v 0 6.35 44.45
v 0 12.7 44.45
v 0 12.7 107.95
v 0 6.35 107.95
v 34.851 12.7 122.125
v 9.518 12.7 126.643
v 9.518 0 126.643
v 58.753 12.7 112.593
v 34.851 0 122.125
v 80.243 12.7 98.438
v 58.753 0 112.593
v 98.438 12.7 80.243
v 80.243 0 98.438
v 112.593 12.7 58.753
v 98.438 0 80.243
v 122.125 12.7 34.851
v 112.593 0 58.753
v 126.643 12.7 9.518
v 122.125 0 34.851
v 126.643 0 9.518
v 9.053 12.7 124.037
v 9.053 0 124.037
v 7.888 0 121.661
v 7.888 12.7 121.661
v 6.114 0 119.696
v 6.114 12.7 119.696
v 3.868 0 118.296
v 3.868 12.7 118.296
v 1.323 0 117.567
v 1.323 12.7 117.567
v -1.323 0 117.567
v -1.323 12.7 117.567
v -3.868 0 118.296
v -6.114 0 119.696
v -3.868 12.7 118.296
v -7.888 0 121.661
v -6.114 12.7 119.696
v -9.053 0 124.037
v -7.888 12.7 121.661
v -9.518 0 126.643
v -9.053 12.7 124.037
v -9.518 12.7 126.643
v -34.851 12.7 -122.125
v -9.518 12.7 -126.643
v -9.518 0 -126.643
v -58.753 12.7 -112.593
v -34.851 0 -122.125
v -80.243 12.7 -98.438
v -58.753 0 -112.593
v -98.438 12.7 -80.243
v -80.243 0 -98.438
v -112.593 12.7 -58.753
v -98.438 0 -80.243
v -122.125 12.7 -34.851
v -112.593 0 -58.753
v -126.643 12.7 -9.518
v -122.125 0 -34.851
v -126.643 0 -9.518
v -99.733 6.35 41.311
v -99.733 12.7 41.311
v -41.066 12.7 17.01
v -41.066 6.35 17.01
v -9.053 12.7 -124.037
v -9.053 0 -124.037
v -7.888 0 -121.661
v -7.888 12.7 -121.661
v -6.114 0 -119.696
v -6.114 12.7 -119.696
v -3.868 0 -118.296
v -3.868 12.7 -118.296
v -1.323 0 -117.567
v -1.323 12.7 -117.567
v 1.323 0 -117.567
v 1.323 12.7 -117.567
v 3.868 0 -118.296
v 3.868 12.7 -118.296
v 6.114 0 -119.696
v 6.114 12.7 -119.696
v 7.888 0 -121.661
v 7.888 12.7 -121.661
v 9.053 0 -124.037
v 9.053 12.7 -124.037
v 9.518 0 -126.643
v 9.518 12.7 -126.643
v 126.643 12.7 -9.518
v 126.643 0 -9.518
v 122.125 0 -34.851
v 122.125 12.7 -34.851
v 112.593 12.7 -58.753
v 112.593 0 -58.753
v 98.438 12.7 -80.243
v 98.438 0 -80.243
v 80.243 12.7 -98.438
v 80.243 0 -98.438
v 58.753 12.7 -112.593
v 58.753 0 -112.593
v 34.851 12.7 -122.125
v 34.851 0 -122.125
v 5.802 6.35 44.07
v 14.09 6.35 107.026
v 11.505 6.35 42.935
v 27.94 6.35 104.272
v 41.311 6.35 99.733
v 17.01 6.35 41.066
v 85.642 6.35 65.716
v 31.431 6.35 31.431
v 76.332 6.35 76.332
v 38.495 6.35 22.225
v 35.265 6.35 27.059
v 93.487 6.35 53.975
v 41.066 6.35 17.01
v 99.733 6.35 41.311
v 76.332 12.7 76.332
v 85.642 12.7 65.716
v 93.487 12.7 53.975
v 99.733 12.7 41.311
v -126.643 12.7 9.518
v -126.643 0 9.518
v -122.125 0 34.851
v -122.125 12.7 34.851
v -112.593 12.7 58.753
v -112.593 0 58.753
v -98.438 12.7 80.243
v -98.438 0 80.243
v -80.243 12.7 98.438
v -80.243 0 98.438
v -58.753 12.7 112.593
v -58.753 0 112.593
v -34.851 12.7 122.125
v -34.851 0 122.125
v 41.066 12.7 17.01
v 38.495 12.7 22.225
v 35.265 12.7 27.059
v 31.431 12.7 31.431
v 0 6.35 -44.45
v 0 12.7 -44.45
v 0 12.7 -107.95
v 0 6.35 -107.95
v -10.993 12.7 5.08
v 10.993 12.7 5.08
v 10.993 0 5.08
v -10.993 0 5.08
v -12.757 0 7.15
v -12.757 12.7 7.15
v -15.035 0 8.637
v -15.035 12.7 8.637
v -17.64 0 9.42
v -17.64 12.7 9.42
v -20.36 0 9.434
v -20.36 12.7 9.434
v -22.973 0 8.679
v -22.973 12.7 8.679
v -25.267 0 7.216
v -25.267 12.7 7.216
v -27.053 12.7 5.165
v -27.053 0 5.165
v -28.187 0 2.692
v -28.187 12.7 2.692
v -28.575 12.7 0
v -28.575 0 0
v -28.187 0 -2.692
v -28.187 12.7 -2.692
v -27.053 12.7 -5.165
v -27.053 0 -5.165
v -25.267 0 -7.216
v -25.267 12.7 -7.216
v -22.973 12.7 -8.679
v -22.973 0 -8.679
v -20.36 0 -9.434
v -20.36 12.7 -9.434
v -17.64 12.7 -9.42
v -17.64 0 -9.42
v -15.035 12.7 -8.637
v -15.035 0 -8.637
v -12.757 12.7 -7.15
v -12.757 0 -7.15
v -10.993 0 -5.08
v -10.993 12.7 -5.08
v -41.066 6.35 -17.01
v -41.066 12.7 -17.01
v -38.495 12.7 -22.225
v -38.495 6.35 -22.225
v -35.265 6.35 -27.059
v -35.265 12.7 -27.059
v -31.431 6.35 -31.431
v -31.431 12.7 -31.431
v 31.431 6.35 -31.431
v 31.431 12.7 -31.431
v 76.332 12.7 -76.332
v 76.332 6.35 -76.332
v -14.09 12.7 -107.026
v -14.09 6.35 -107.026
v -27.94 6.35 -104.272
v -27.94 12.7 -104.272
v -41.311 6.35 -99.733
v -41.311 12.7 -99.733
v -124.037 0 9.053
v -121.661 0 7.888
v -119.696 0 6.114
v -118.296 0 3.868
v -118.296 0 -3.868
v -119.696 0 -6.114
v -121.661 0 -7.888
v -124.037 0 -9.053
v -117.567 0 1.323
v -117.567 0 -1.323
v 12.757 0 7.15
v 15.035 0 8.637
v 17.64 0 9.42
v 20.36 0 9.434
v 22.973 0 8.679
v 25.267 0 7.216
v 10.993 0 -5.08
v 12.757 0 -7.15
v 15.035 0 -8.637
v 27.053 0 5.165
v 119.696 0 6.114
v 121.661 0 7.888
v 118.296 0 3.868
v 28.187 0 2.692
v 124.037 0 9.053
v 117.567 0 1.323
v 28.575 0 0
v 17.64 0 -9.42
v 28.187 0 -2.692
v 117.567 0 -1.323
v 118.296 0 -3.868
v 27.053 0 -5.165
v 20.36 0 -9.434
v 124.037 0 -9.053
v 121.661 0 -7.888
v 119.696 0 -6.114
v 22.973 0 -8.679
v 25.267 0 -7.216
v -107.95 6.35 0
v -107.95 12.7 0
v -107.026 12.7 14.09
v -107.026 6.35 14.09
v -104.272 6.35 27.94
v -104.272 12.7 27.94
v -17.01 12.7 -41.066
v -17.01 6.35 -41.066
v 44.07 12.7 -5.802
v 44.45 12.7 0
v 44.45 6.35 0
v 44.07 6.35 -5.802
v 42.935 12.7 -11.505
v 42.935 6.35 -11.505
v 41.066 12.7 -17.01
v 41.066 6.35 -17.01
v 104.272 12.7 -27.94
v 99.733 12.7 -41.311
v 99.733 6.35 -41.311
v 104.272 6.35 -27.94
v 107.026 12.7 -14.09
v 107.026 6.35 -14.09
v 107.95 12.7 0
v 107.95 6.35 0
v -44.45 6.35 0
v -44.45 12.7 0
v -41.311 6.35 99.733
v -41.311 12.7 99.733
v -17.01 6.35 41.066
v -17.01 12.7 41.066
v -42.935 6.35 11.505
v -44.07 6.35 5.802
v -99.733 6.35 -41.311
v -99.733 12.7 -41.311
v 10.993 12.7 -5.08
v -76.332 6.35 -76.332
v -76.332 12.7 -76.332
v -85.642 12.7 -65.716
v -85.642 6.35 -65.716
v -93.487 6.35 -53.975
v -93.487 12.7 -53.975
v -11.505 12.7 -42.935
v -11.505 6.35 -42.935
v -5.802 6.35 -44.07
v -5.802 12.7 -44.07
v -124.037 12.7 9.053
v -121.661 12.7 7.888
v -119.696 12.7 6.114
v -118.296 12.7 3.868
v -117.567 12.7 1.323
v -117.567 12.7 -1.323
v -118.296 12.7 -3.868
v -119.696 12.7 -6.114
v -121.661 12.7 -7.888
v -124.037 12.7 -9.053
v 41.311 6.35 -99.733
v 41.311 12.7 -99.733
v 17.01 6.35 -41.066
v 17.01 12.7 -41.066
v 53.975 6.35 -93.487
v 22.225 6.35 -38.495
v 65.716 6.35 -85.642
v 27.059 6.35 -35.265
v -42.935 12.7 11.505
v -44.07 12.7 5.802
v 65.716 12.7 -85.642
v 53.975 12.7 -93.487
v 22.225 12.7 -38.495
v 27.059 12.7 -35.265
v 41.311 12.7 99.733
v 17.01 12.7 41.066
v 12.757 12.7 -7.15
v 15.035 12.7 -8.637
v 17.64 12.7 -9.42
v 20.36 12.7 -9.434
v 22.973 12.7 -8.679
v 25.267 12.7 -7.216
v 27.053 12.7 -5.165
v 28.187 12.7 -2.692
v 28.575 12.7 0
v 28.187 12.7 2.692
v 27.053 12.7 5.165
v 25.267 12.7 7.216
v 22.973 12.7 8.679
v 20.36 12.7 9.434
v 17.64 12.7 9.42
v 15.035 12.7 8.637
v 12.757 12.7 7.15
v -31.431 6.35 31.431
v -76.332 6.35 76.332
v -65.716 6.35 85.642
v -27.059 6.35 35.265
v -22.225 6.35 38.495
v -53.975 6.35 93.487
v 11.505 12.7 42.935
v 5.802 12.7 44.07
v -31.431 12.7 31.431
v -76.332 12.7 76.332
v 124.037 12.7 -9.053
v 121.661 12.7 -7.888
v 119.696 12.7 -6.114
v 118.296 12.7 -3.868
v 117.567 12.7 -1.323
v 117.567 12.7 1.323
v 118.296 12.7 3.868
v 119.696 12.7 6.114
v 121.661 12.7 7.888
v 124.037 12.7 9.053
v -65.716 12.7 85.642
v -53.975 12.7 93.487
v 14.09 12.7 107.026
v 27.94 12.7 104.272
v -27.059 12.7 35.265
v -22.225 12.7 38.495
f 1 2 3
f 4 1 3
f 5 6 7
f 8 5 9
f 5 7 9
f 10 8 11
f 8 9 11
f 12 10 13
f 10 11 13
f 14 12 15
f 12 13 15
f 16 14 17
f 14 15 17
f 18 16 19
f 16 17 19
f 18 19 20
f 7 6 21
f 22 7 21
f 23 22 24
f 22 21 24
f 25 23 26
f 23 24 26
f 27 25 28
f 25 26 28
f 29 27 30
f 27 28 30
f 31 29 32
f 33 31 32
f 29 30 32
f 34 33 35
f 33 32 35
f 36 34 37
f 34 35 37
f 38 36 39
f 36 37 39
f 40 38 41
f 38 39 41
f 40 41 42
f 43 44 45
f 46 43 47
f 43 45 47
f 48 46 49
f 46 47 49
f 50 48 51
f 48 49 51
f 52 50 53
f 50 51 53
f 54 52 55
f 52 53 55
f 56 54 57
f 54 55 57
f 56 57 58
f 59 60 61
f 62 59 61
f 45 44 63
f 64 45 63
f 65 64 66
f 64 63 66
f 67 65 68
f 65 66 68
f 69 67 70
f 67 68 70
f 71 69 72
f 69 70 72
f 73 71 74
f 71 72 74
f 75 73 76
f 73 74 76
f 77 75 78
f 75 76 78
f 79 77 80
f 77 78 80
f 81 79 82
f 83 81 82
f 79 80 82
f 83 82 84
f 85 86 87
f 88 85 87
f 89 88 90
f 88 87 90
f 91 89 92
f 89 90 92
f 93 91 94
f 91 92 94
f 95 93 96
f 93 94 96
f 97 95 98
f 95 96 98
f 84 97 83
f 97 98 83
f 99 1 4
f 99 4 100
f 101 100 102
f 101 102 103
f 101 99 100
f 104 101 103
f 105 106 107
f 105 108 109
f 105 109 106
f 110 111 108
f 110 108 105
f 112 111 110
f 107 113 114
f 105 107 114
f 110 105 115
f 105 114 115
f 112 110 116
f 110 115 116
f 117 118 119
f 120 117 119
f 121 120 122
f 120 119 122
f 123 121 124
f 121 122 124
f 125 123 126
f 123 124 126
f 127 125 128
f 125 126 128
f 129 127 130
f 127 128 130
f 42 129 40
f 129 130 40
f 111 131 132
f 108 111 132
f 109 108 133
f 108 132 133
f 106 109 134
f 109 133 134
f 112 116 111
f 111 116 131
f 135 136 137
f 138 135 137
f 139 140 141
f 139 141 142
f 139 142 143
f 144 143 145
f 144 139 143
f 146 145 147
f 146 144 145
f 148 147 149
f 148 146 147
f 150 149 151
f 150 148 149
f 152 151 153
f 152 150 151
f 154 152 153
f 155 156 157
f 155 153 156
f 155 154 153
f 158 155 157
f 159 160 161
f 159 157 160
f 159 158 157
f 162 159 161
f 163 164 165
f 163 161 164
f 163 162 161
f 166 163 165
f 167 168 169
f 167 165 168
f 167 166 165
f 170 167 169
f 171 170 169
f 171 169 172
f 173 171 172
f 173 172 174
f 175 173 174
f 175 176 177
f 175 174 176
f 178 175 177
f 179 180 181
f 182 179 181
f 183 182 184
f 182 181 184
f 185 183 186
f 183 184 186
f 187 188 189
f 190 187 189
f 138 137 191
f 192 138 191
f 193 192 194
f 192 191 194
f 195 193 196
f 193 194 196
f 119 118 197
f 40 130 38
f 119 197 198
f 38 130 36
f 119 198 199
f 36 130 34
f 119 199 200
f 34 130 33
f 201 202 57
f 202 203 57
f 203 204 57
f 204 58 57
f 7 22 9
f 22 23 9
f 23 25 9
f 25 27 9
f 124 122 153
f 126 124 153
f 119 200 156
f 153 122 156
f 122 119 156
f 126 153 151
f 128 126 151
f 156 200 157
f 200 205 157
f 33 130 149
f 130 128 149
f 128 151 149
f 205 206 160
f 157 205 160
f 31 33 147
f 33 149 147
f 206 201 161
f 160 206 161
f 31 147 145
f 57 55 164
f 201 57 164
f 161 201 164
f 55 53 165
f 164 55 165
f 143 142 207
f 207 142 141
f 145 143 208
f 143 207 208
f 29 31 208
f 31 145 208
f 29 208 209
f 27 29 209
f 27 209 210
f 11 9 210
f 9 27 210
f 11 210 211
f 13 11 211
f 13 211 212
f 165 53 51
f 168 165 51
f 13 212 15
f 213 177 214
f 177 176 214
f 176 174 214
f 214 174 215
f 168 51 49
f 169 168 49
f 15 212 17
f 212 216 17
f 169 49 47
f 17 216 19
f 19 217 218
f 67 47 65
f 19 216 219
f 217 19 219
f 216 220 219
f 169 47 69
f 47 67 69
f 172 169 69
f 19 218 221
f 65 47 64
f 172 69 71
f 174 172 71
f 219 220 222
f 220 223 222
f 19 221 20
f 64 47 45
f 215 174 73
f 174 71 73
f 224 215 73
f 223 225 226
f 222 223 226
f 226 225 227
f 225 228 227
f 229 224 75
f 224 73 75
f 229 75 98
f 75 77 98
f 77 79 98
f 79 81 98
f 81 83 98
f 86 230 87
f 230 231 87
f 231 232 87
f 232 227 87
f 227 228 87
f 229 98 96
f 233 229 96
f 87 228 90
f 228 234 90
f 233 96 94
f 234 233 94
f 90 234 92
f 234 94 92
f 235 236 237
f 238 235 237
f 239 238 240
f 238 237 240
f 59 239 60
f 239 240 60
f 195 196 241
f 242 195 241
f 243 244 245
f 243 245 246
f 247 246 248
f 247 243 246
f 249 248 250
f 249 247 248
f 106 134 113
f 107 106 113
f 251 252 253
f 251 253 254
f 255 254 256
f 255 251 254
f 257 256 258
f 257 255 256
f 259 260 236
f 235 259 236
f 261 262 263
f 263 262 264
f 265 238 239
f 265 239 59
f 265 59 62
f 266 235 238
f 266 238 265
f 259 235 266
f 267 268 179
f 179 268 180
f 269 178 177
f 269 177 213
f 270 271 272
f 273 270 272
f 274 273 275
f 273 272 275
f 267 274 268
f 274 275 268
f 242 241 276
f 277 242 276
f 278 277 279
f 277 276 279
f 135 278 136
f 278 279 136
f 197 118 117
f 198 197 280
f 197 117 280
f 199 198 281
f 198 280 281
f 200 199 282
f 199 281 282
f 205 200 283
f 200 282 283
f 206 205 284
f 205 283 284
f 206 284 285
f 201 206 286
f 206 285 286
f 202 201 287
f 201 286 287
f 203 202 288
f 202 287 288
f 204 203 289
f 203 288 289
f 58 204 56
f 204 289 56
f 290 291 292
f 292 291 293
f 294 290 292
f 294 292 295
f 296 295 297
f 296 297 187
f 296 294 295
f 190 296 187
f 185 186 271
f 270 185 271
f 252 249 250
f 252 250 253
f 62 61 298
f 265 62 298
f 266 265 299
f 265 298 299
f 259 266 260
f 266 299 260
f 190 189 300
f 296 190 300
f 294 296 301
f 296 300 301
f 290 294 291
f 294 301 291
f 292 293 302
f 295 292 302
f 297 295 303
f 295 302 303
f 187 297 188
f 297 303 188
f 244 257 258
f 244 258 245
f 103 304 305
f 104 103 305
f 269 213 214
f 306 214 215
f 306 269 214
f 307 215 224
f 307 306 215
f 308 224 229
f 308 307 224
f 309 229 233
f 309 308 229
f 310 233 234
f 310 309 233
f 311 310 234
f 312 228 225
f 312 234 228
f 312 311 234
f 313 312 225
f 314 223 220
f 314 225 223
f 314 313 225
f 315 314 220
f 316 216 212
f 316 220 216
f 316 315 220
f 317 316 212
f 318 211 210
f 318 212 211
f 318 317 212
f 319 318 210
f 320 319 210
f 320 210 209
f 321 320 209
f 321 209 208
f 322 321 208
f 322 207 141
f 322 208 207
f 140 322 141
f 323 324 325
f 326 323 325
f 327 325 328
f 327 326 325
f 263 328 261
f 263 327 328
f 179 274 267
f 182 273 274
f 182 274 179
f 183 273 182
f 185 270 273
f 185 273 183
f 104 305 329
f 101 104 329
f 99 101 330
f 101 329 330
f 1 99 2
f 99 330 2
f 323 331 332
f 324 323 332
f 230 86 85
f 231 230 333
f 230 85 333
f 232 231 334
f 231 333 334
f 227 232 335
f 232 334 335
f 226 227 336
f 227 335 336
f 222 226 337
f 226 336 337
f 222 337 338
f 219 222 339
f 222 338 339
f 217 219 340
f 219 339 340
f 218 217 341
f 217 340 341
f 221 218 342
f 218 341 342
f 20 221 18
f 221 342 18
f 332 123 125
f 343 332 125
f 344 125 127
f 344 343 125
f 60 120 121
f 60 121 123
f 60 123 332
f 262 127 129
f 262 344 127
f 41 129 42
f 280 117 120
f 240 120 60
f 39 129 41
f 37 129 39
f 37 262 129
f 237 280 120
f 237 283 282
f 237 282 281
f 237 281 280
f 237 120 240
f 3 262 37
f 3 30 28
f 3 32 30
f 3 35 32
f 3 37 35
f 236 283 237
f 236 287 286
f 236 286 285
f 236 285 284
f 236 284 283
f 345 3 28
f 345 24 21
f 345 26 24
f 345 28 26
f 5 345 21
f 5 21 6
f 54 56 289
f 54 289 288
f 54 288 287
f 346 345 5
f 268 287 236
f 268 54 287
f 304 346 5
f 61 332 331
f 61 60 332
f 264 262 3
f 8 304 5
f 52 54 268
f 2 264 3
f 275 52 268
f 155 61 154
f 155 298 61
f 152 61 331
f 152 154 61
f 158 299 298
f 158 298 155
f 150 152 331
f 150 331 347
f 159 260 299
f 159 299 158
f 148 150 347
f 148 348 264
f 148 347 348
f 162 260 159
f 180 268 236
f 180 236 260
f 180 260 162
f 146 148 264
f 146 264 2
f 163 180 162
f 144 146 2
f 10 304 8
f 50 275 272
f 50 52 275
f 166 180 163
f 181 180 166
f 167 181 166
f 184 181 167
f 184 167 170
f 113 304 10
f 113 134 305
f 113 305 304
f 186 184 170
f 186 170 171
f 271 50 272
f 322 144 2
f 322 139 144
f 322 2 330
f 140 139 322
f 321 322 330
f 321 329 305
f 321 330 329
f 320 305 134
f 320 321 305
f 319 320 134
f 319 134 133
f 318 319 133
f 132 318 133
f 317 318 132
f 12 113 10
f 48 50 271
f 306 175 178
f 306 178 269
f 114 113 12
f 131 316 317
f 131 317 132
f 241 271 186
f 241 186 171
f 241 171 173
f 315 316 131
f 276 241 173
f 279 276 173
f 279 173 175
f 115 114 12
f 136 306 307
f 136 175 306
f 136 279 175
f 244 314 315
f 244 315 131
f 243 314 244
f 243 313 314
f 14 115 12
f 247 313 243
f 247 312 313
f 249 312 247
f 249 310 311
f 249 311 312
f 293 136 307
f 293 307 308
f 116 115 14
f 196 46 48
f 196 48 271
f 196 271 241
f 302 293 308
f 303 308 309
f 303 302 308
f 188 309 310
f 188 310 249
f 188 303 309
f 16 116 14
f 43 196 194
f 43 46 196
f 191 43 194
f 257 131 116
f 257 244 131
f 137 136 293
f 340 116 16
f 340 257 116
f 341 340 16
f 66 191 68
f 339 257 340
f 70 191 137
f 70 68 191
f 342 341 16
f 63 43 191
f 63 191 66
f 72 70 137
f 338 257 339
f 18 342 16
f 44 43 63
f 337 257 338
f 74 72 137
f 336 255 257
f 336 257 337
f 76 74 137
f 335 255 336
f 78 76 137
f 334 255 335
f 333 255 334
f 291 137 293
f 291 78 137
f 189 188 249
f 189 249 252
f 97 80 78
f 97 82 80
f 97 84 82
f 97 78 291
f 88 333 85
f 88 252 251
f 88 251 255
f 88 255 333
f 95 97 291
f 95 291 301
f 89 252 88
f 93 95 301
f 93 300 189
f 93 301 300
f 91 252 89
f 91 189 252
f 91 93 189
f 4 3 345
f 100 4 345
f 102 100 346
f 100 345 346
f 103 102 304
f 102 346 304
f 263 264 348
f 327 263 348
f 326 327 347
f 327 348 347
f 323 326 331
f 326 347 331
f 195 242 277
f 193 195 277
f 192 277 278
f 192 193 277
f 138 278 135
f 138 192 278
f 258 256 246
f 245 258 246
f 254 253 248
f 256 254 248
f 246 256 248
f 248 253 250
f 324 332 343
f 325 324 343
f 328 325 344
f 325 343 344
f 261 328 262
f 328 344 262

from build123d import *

# Parameters (mm, degrees)
SKETCH1_R           = 127
BOSS_EXTRUDE1_DEPTH = 12.7
CUT_EXTRUDE1_DEPTH  = 6.35
SKETCH2_3_R         = 9.525
CUT_EXTRUDE2_DEPTH  = 181.05357536


with BuildPart() as part:
    # Sketch1 → Boss-Extrude1 (new body)
    with BuildSketch(Plane(origin=(0, 0, 0), x_dir=(1, 0, 0), z_dir=(0, 1, 0))):
        Circle(SKETCH1_R)
    extrude(amount=BOSS_EXTRUDE1_DEPTH)

    # Sketch2 → Cut-Extrude1 (cut)
    with BuildSketch(Plane(origin=(0, 12.7, 0), x_dir=(1, 0, 0), z_dir=(0, 1, 0))):
        with BuildLine():
            Line((99.732795535, 41.310676524), (41.06644522, 17.010278569))
            ThreePointArc((41.06644522, 17.010278569), (43.595905714, 8.671764814), (44.45, 0))
            Line((44.45, 0), (107.95, 0))
            ThreePointArc((107.95, 0), (105.87577102, 21.060000262), (99.732795535, 41.310676524))
        make_face()
        with BuildLine():
            Line((99.732795535, -41.310676524), (41.06644522, -17.010278569))
            ThreePointArc((41.06644522, -17.010278569), (36.958824267, -24.695096858), (31.430896424, -31.430896424))
            Line((31.430896424, -31.430896424), (76.332177029, -76.332177029))
            ThreePointArc((76.332177029, -76.332177029), (89.757144648, -59.973806654), (99.732795535, -41.310676524))
        make_face()
        with BuildLine():
            Line((41.310676524, -99.732795535), (17.010278569, -41.06644522))
            ThreePointArc((17.010278569, -41.06644522), (8.671764814, -43.595905714), (0, -44.45))
            Line((0, -44.45), (0, -107.95))
            ThreePointArc((0, -107.95), (21.060000262, -105.87577102), (41.310676524, -99.732795535))
        make_face()
        with BuildLine():
            Line((-41.310676524, -99.732795535), (-17.010278569, -41.06644522))
            ThreePointArc((-17.010278569, -41.06644522), (-24.695096858, -36.958824267), (-31.430896424, -31.430896424))
            Line((-31.430896424, -31.430896424), (-76.332177029, -76.332177029))
            ThreePointArc((-76.332177029, -76.332177029), (-59.973806654, -89.757144648), (-41.310676524, -99.732795535))
        make_face()
        with BuildLine():
            Line((-99.732795535, -41.310676524), (-41.06644522, -17.010278569))
            ThreePointArc((-41.06644522, -17.010278569), (-43.595905714, -8.671764814), (-44.45, 0))
            Line((-44.45, 0), (-107.95, 0))
            ThreePointArc((-107.95, 0), (-105.87577102, -21.060000262), (-99.732795535, -41.310676524))
        make_face()
        with BuildLine():
            Line((-99.732795535, 41.310676524), (-41.06644522, 17.010278569))
            ThreePointArc((-41.06644522, 17.010278569), (-36.958824267, 24.695096858), (-31.430896424, 31.430896424))
            Line((-31.430896424, 31.430896424), (-76.332177029, 76.332177029))
            ThreePointArc((-76.332177029, 76.332177029), (-89.757144648, 59.973806654), (-99.732795535, 41.310676524))
        make_face()
        with BuildLine():
            Line((-41.310676524, 99.732795535), (-17.010278569, 41.06644522))
            ThreePointArc((-17.010278569, 41.06644522), (-8.671764814, 43.595905714), (0, 44.45))
            Line((0, 44.45), (0, 107.95))
            ThreePointArc((0, 107.95), (-21.060000262, 105.87577102), (-41.310676524, 99.732795535))
        make_face()
        with BuildLine():
            Line((41.310676524, 99.732795535), (17.010278569, 41.06644522))
            ThreePointArc((17.010278569, 41.06644522), (24.695096858, 36.958824267), (31.430896424, 31.430896424))
            Line((31.430896424, 31.430896424), (76.332177029, 76.332177029))
            ThreePointArc((76.332177029, 76.332177029), (59.973806654, 89.757144648), (41.310676524, 99.732795535))
        make_face()
    extrude(amount=-CUT_EXTRUDE1_DEPTH, mode=Mode.SUBTRACT)

    # Sketch2<3> → Cut-Extrude2 (cut, through all)
    with BuildSketch(Plane(origin=(0, 12.7, 0), x_dir=(1, 0, 0), z_dir=(0, 1, 0))):
        with BuildLine():
            Line((-10.992753262, -5.08), (10.992753262, -5.08))
            ThreePointArc((10.992753262, -5.08), (28.575, 0), (10.992753262, 5.08))
            Line((10.992753262, 5.08), (-10.992753262, 5.08))
            ThreePointArc((-10.992753262, 5.08), (-28.575, 0), (-10.992753262, -5.08))
        make_face()
        with BuildLine():
            ThreePointArc((9.518300378, 126.6428125), (0, 127), (-9.518300378, 126.6428125))
            ThreePointArc((-9.518300378, 126.6428125), (0, 117.475), (9.518300378, 126.6428125))
        make_face()
        with Locations((-127, 0)):
            Circle(SKETCH2_3_R)
        with BuildLine():
            ThreePointArc((126.6428125, -9.518300378), (127, 0), (126.6428125, 9.518300378))
            ThreePointArc((126.6428125, 9.518300378), (117.475, 0), (126.6428125, -9.518300378))
        make_face()
        with BuildLine():
            ThreePointArc((9.518300378, -126.6428125), (0, -117.475), (-9.518300378, -126.6428125))
            ThreePointArc((-9.518300378, -126.6428125), (0, -127), (9.518300378, -126.6428125))
        make_face()
    extrude(amount=-CUT_EXTRUDE2_DEPTH, mode=Mode.SUBTRACT)


solid = part.part
